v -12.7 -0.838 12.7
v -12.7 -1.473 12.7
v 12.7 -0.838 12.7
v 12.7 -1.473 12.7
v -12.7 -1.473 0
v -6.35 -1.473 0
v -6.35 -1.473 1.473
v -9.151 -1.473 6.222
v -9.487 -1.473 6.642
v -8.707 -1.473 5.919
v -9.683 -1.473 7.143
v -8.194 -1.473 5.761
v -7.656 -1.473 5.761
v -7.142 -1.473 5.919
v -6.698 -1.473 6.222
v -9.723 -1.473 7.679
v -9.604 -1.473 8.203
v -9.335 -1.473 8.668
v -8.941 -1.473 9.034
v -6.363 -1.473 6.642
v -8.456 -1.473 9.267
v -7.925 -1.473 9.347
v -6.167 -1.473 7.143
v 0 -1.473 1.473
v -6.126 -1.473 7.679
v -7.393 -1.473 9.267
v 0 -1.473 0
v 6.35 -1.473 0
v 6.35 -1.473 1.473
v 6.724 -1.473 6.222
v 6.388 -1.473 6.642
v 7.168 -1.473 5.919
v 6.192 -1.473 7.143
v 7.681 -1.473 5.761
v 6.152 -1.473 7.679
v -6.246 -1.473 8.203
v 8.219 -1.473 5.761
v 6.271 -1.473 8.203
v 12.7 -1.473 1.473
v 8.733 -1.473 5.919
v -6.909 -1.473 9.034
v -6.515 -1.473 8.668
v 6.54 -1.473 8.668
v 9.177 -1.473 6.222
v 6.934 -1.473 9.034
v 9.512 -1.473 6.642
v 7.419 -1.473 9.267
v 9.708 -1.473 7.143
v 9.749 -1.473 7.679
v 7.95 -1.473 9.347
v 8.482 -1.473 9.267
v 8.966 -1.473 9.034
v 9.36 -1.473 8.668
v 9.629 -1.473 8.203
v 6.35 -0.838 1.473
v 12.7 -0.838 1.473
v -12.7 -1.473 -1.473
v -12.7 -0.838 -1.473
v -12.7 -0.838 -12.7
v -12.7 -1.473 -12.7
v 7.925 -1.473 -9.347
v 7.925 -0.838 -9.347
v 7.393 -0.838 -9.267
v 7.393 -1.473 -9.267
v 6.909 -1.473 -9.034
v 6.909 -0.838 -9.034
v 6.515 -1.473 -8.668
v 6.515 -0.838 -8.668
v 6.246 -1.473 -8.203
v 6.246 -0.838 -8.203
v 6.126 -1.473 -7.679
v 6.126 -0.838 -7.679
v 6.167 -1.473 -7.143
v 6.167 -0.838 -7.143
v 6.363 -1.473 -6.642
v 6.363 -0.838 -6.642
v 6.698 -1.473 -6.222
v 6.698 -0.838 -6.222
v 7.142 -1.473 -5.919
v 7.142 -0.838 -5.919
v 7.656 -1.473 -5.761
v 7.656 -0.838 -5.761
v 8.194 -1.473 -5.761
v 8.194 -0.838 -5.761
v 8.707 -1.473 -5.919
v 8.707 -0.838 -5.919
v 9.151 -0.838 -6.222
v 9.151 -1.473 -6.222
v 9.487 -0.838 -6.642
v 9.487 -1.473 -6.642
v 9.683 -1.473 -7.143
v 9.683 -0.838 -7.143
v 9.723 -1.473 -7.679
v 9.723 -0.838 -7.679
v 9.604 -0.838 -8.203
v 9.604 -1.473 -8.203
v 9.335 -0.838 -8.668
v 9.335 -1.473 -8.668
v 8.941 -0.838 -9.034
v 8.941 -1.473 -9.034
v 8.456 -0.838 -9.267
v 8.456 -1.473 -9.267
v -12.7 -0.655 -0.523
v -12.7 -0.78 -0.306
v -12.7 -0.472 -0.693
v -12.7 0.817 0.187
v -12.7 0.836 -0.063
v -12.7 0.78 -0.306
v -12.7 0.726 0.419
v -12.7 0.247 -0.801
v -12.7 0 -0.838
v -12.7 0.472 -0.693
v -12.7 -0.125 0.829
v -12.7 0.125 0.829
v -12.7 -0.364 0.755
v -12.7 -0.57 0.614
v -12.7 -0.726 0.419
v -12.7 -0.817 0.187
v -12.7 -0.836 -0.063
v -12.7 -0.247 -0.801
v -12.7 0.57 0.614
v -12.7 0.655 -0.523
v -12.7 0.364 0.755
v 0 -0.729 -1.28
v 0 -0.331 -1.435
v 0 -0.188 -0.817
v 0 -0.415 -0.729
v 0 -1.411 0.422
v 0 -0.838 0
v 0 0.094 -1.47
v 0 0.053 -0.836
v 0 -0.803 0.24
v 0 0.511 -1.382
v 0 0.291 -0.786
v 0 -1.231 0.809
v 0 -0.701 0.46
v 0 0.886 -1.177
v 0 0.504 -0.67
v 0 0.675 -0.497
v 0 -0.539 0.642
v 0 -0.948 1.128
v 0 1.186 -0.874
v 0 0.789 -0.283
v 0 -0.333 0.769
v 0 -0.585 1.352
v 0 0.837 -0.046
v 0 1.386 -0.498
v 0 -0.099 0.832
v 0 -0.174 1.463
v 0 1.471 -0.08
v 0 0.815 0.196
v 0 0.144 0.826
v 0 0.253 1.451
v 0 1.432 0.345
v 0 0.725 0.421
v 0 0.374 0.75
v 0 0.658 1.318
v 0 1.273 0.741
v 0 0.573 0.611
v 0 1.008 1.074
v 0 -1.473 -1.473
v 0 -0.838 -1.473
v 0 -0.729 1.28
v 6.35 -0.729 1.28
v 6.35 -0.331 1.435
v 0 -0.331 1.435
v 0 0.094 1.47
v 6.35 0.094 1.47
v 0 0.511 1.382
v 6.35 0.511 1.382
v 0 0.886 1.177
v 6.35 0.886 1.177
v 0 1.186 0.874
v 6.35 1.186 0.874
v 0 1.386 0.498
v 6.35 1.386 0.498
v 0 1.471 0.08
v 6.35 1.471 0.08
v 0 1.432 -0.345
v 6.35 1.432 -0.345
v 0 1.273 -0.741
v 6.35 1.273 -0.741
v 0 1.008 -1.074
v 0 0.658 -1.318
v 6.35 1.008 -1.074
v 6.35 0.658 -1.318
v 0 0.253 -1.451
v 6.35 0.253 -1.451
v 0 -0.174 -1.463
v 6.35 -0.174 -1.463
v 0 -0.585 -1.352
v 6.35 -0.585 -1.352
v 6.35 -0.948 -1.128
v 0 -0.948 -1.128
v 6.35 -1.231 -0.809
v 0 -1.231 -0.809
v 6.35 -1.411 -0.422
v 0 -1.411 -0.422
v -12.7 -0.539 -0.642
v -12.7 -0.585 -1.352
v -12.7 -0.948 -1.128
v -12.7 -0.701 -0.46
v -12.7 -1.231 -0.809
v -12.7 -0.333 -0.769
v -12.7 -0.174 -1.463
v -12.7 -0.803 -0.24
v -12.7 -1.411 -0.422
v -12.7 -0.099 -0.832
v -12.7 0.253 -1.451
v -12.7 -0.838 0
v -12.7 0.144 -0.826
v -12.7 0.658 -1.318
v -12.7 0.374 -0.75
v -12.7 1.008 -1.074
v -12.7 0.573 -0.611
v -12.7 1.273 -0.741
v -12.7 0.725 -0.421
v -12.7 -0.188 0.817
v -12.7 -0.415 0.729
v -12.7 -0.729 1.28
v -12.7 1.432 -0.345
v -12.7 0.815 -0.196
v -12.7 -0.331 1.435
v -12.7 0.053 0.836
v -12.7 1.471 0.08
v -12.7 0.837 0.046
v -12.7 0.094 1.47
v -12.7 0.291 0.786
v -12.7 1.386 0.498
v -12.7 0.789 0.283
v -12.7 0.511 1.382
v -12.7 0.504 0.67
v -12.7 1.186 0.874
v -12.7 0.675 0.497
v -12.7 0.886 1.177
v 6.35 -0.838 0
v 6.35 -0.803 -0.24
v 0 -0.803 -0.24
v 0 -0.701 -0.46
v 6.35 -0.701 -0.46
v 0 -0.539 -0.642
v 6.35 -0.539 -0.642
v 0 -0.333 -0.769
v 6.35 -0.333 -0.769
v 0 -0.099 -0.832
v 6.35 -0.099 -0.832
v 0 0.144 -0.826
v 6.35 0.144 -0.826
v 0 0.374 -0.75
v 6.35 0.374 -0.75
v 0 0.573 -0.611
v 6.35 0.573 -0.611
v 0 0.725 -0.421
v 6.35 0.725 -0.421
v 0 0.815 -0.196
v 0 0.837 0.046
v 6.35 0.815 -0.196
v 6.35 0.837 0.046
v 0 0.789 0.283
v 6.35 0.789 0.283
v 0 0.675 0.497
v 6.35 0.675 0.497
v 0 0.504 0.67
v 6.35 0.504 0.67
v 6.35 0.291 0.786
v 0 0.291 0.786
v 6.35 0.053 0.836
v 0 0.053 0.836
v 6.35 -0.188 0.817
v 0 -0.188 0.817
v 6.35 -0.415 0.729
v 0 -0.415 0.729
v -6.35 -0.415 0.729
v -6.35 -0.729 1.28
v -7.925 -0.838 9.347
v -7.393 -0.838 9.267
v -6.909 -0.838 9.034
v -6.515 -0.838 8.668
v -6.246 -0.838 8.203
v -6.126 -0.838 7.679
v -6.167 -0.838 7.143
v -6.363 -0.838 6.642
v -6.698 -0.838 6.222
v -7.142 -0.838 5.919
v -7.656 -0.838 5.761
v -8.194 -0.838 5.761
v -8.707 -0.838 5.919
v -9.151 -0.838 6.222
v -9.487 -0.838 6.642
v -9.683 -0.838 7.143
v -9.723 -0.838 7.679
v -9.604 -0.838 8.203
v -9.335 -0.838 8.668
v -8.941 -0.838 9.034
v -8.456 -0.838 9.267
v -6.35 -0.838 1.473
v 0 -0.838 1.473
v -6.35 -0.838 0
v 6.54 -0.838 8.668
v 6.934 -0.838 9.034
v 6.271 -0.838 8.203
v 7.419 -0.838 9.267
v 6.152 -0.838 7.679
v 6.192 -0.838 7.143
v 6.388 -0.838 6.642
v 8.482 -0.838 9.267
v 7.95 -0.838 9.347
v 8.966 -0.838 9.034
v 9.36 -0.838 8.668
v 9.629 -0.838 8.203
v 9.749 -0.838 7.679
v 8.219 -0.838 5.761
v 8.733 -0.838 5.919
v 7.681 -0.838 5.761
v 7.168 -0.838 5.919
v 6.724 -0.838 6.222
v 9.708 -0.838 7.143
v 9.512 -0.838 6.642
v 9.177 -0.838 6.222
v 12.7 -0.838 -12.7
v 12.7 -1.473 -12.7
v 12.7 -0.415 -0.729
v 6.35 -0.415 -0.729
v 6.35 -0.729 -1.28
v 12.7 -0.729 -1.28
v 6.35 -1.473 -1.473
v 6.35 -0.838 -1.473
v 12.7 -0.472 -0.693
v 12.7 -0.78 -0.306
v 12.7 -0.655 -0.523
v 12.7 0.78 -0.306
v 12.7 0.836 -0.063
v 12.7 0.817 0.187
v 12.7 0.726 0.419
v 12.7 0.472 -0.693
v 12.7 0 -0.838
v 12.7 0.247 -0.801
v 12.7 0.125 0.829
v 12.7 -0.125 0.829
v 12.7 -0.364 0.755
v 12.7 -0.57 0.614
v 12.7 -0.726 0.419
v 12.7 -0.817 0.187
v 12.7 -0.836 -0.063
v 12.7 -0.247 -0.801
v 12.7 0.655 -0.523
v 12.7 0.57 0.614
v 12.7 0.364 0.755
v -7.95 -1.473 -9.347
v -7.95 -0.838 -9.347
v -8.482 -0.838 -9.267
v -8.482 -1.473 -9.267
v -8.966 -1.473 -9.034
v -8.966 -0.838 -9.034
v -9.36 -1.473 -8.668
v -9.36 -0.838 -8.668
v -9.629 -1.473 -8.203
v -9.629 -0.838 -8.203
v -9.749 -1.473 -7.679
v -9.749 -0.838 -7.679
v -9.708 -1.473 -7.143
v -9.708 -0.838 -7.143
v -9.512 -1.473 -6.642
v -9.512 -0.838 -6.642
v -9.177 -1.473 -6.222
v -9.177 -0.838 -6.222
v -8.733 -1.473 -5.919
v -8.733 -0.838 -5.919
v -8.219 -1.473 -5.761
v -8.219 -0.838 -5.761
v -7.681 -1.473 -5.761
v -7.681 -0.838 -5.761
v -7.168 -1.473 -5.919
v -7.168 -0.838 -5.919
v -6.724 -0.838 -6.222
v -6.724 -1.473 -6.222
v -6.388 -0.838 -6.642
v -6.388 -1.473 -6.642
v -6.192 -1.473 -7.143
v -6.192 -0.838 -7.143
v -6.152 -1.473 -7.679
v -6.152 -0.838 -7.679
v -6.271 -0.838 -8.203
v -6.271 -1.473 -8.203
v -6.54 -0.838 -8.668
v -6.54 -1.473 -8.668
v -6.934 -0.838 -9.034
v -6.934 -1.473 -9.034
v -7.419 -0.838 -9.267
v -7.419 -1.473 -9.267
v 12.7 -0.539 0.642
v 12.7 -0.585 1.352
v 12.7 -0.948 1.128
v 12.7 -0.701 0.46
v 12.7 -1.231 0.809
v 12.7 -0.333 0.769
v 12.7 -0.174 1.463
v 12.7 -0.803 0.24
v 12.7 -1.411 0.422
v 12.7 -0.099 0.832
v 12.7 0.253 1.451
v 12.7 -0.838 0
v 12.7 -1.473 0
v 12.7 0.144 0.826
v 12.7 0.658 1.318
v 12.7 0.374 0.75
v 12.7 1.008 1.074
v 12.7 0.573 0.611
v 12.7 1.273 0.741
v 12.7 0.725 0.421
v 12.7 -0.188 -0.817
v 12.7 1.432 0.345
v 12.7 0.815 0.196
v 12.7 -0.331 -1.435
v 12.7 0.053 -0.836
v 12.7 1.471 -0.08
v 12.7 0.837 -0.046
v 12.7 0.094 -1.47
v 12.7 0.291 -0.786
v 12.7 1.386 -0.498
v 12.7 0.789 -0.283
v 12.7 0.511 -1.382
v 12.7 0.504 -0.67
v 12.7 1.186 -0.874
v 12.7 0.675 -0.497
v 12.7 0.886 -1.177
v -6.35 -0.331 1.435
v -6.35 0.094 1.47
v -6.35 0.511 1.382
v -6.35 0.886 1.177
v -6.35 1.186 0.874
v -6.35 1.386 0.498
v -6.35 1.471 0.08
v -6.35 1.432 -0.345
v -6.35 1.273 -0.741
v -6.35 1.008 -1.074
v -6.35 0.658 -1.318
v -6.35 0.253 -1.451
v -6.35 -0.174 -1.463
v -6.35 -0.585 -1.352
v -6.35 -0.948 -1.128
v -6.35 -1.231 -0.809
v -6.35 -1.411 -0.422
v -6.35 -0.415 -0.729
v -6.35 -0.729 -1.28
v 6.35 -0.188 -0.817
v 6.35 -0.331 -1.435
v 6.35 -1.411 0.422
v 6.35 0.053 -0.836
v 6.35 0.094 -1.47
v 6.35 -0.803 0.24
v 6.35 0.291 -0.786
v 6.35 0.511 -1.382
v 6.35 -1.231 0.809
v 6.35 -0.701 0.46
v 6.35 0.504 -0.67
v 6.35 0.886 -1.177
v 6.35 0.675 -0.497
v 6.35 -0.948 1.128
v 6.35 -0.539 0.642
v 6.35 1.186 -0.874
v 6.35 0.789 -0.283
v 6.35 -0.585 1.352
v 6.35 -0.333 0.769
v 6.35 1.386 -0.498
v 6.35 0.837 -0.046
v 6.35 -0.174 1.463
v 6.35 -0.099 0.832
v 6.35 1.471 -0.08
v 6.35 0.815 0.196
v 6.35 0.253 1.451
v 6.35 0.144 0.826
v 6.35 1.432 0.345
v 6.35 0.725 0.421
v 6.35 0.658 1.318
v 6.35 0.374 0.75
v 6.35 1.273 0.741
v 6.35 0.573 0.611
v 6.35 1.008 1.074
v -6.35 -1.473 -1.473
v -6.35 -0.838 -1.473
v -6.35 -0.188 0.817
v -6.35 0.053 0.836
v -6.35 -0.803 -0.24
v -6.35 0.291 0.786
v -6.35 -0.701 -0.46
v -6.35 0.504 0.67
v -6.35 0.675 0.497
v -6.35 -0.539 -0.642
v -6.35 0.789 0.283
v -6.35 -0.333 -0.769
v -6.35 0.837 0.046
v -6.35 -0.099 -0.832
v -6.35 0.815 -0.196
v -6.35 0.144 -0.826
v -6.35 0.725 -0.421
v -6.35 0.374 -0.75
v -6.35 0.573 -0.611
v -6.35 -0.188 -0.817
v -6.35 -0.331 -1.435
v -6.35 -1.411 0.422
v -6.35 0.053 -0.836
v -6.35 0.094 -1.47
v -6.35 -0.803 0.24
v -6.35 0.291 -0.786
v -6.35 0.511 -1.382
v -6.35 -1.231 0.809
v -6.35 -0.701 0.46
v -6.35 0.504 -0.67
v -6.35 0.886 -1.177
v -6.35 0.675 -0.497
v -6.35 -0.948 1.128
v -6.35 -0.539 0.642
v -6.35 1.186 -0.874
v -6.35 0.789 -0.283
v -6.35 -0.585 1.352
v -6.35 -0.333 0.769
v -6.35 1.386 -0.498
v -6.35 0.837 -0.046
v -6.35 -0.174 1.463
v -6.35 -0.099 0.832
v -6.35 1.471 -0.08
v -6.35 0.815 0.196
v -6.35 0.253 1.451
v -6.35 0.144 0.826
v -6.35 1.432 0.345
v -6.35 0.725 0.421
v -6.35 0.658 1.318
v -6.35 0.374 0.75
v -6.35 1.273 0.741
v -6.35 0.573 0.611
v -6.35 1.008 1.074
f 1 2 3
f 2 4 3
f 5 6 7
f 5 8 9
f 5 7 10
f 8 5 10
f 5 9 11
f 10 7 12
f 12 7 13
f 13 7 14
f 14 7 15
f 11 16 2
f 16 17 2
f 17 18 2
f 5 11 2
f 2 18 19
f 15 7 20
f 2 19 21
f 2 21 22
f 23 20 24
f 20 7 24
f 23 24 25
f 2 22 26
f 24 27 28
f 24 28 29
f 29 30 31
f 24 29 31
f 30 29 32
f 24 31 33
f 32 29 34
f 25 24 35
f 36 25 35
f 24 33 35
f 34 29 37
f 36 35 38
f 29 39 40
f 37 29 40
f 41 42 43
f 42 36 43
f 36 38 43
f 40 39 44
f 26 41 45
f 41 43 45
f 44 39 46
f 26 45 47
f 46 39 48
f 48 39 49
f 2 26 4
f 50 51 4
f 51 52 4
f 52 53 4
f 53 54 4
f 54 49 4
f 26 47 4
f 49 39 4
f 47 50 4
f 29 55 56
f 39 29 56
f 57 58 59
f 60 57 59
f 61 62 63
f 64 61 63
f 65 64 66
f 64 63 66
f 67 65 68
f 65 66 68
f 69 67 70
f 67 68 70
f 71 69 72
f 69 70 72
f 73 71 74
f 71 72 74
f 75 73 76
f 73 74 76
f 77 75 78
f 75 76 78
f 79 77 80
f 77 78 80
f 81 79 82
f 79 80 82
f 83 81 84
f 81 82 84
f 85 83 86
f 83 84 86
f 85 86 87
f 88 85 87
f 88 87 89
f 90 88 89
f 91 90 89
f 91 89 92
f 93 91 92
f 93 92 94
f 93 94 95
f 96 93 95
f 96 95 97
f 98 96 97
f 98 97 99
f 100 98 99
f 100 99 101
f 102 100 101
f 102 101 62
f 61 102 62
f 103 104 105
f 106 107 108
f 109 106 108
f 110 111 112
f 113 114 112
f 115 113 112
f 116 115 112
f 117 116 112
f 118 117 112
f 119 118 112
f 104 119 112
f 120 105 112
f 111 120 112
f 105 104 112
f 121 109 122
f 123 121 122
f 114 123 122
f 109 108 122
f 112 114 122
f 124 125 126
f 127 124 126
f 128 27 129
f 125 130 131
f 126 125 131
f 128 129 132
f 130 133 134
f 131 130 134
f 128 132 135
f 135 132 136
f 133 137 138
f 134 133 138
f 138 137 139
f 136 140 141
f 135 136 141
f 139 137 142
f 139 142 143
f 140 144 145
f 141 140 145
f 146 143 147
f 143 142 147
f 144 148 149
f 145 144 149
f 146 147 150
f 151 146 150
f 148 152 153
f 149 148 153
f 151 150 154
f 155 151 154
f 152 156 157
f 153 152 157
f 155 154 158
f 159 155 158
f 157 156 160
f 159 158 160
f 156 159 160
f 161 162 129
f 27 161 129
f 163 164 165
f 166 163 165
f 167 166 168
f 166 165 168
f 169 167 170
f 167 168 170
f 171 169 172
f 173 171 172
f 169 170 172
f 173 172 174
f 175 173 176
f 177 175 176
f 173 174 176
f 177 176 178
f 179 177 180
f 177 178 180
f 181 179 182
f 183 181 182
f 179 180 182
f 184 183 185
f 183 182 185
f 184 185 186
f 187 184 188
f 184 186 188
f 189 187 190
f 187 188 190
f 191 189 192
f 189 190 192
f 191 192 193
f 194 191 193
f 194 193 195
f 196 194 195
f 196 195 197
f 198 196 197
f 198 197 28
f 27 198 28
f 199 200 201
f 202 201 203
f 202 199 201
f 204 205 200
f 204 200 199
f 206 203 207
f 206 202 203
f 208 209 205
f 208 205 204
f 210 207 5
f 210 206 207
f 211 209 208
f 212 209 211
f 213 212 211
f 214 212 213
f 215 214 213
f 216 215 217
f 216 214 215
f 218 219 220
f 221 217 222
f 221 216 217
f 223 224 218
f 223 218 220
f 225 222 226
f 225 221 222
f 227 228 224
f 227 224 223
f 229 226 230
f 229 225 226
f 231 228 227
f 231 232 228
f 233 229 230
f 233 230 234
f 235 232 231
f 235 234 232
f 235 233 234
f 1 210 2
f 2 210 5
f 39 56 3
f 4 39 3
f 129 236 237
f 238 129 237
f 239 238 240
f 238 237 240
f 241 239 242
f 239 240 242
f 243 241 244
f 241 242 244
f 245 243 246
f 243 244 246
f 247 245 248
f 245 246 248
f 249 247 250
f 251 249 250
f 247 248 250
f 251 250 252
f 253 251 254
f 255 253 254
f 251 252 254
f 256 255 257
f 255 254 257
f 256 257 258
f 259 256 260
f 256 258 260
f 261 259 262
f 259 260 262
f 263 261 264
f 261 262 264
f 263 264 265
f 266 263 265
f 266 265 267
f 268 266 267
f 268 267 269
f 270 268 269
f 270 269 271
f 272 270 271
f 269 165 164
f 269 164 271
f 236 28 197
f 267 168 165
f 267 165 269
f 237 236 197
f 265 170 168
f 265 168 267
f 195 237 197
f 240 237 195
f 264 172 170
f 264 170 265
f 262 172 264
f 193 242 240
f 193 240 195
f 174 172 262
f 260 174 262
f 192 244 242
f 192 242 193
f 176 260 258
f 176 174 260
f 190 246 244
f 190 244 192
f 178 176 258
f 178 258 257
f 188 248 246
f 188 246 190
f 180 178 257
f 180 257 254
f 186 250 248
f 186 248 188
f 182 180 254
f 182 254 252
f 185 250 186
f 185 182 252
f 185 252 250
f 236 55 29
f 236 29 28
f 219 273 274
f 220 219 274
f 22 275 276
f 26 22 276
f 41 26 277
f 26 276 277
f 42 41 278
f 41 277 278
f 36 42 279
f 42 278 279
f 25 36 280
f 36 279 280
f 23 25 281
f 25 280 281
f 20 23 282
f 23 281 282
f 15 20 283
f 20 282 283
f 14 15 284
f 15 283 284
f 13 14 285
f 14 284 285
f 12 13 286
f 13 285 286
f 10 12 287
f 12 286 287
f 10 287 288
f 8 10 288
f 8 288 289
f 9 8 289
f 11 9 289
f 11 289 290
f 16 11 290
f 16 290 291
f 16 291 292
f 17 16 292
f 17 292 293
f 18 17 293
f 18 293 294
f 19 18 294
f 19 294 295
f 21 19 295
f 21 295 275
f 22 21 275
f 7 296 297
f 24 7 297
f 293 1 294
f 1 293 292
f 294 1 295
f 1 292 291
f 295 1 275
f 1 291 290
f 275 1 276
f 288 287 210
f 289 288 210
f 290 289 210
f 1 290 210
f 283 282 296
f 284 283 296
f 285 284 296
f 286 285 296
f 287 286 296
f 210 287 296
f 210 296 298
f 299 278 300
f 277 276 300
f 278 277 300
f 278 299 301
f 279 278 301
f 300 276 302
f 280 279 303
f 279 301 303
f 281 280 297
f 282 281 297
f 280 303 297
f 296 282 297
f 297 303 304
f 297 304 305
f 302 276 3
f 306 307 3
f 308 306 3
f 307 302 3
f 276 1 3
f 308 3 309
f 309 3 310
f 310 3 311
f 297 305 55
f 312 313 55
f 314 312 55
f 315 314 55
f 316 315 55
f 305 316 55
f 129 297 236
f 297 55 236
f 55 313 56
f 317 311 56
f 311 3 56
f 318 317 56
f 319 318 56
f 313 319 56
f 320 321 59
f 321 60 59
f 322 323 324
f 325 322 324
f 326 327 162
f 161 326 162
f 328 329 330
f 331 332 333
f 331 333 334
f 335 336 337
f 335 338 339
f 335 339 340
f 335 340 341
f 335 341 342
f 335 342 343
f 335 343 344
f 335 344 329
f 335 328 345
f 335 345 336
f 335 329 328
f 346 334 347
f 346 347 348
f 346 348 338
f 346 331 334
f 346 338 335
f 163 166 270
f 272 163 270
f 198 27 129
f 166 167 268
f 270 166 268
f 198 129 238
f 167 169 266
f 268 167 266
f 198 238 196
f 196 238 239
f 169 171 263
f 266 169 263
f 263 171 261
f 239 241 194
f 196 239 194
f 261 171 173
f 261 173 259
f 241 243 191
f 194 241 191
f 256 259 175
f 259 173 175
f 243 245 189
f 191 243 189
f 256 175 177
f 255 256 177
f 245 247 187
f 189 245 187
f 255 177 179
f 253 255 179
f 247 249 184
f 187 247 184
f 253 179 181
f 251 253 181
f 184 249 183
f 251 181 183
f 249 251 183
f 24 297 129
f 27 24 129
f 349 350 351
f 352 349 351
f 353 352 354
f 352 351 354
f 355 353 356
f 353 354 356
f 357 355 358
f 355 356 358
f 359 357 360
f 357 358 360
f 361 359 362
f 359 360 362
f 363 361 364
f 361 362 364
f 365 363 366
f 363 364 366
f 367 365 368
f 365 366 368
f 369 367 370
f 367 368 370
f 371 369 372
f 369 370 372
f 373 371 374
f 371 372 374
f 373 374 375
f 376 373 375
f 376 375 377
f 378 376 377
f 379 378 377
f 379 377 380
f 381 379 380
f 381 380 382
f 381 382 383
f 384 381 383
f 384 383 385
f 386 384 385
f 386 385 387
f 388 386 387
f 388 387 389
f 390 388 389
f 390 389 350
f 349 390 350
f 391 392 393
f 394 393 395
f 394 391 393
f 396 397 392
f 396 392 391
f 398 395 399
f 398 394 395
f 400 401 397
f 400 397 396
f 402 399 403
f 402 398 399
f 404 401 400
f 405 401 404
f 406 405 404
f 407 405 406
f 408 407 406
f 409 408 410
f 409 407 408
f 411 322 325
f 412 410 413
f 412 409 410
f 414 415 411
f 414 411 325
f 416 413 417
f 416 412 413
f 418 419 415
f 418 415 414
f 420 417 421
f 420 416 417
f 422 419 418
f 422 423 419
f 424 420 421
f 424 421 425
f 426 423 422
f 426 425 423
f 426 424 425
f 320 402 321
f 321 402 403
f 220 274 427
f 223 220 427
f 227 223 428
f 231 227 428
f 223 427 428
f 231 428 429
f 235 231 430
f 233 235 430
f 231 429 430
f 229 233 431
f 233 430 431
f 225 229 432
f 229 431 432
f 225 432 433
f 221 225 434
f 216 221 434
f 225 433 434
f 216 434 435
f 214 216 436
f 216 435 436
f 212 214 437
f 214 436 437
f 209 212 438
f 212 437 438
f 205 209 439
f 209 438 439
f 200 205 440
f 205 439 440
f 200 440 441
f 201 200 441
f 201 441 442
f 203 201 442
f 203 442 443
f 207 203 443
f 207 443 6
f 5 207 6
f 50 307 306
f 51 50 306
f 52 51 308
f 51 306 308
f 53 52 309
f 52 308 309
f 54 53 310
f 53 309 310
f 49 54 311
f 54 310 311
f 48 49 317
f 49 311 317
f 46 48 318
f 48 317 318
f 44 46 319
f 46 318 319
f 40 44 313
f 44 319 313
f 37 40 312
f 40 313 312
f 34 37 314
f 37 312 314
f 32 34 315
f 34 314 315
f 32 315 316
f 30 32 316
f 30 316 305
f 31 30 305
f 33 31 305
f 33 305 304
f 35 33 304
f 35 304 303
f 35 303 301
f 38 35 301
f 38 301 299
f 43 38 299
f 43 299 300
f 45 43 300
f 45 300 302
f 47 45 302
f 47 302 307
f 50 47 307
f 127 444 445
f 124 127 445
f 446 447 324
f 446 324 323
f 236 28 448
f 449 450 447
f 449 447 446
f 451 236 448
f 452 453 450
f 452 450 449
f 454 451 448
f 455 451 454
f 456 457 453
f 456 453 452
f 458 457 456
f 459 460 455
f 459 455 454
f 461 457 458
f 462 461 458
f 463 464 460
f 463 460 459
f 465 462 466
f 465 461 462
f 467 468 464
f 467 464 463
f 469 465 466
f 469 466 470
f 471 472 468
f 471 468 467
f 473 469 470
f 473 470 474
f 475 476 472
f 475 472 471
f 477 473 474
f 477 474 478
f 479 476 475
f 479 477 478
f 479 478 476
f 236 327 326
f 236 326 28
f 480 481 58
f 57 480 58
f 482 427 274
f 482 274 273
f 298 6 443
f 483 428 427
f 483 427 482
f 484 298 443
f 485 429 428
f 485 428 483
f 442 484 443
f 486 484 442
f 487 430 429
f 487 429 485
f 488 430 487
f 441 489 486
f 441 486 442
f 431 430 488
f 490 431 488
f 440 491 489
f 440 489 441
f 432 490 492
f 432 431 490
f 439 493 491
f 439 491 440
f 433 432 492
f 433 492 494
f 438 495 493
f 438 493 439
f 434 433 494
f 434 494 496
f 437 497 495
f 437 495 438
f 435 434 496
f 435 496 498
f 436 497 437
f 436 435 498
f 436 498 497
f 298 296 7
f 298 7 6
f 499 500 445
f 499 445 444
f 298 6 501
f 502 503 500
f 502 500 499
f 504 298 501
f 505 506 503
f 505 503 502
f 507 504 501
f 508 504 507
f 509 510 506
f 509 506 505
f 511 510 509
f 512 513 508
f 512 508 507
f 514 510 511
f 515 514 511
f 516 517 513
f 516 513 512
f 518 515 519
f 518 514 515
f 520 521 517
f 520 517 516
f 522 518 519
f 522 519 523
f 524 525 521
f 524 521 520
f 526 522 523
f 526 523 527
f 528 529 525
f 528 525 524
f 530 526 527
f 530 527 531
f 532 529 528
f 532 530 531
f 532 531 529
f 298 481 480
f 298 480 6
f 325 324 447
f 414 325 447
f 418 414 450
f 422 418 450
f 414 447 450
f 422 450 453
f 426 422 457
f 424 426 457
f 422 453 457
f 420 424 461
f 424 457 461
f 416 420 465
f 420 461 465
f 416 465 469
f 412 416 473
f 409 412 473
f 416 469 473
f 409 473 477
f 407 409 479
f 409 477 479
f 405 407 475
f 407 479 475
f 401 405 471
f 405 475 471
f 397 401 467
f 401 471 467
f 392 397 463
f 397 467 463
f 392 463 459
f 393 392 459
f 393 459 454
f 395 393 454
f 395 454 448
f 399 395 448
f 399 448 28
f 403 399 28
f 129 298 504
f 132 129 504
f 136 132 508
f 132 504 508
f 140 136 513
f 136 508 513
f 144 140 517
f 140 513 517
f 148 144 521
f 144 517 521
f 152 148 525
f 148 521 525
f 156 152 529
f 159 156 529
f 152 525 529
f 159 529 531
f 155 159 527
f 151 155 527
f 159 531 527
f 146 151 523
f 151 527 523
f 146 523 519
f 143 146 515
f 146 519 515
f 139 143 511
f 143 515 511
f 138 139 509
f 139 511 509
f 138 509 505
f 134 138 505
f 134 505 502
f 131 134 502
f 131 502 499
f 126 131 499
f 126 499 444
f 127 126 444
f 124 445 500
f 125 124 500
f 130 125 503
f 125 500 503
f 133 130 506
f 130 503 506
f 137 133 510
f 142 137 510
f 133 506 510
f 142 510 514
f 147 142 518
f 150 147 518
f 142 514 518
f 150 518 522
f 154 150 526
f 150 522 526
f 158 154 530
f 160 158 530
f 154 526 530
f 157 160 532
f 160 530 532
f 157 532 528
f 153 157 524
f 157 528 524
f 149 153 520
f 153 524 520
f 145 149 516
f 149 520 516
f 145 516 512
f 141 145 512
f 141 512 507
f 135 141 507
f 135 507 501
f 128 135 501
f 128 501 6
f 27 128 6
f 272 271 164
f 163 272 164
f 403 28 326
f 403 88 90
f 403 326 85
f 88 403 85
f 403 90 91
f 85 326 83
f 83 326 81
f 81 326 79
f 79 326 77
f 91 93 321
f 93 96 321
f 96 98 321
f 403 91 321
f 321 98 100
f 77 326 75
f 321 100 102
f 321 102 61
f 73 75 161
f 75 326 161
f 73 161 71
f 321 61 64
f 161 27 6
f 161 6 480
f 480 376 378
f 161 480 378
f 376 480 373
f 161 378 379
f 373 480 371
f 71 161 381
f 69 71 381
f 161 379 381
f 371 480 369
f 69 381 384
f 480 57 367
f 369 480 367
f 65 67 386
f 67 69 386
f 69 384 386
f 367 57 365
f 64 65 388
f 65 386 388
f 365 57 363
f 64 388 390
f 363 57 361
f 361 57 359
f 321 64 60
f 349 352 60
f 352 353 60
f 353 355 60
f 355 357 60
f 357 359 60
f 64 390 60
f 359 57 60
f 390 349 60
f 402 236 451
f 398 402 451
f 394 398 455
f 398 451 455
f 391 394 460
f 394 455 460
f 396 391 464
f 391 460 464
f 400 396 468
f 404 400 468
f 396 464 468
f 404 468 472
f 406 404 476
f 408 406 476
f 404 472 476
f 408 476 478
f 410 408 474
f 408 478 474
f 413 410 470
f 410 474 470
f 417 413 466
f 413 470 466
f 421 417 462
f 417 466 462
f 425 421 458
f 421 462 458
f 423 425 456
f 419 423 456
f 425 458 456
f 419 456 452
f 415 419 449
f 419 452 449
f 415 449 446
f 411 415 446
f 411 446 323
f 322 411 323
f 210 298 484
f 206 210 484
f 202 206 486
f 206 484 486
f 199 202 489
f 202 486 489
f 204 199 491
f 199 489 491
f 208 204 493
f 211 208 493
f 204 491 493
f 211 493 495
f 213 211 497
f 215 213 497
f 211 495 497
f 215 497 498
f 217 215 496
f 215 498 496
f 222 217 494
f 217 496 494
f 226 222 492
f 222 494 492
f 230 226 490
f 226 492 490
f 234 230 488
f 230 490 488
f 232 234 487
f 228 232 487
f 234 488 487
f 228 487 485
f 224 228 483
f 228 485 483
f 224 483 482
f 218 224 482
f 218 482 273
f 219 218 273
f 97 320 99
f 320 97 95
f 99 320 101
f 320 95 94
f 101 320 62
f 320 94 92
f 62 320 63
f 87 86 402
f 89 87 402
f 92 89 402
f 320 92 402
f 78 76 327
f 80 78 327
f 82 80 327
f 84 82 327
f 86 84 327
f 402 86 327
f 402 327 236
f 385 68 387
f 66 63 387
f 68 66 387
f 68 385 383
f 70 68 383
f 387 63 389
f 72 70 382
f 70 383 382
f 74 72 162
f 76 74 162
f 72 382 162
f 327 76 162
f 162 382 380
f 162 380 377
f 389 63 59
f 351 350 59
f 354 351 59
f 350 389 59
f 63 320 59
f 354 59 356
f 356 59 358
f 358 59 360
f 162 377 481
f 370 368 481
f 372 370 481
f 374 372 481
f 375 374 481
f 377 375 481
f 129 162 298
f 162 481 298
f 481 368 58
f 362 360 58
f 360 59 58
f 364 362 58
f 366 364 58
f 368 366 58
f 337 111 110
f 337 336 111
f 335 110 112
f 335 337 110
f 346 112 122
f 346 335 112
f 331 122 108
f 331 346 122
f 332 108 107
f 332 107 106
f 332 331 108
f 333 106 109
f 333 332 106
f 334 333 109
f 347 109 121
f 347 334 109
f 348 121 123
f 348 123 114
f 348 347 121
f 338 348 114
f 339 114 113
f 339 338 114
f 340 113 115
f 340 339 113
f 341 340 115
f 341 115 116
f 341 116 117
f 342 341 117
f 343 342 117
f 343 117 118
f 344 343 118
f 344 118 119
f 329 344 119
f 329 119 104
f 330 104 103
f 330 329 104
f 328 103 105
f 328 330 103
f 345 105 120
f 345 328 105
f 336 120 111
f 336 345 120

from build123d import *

# Parameters (mm, degrees)
BOSS_EXTRUDE1_DEPTH = 12.7
SKETCH4_W           = 6.35
SKETCH4_H           = 2.9464
CUT_EXTRUDE1_DEPTH  = 19.020830121
LPATTERN1_COUNT     = 6
LPATTERN1_PITCH     = 12.7
SKETCH5_R           = 1.8034
CUT_EXTRUDE2_DEPTH  = 19.108632471
CIRPATTERN1_COUNT   = 2
SKETCH6_R           = 0.8382
BOSS_EXTRUDE2_DEPTH = 12.7


with BuildPart() as part:
    # Sketch3 → Boss-Extrude1 (new, symmetric)
    with BuildSketch(Plane(origin=(0, 0, 0), x_dir=(0, 0, -1), z_dir=(1, 0, 0))):
        with BuildLine():
            Line((0, -1.4732), (-12.7, -1.4732))
            Line((-12.7, -1.4732), (-12.7, -0.8382))
            Line((-12.7, -0.8382), (0, -0.8382))
            ThreePointArc((0, -0.8382), (0.421388638, 0.724576328), (-0.728533124, -0.414510226))
            Line((-0.728533124, -0.414510226), (-1.280452157, -0.728533124))
            ThreePointArc((-1.280452157, -0.728533124), (0.740622455, 1.273497789), (0, -1.4732))
        make_face()
    extrude(amount=BOSS_EXTRUDE1_DEPTH, both=True)

    # Sketch4 → Cut-Extrude1 (cut, symmetric)
    with BuildSketch(Plane(origin=(0, 0, 0), x_dir=(1, 0, 0), z_dir=(0, 1, 0))):
        with Locations((-3.175, 0)):
            Rectangle(SKETCH4_W, SKETCH4_H)
    cut_extrude1 = extrude(amount=CUT_EXTRUDE1_DEPTH, both=True, mode=Mode.SUBTRACT)

    # LPattern1: Cut-Extrude1 ×6
    with Locations(*[(i * LPATTERN1_PITCH, 0, 0) for i in range(1, LPATTERN1_COUNT)]):
        add(cut_extrude1, mode=Mode.SUBTRACT)

    # Sketch5 → Cut-Extrude2 (cut, through all)
    with BuildSketch(Plane(origin=(0, -0.8382, 0), x_dir=(1, 0, 0), z_dir=(0, 1, 0))):
        with Locations(Location((7.9502, -7.5438, 0), (0, 0, 270))):
            Circle(SKETCH5_R)
        with Locations(Location((-7.9248, -7.5438, 0), (0, 0, 270))):
            Circle(SKETCH5_R)
    extrude(amount=-CUT_EXTRUDE2_DEPTH, mode=Mode.SUBTRACT)


with BuildPart() as cirpattern1_1:
    # CirPattern1: pattern copy
    add(part.part.rotate(Axis((0, 0, 0), (0, 1, 0)), 1 * 360 / CIRPATTERN1_COUNT))


with BuildPart() as body_3:
    # Sketch6 → Boss-Extrude2 (new, symmetric)
    with BuildSketch(Plane(origin=(0, 0, 0), x_dir=(0, 0, -1), z_dir=(1, 0, 0))):
        Circle(SKETCH6_R)
    extrude(amount=BOSS_EXTRUDE2_DEPTH, both=True)


solid = Compound([part.part, cirpattern1_1.part, body_3.part])
